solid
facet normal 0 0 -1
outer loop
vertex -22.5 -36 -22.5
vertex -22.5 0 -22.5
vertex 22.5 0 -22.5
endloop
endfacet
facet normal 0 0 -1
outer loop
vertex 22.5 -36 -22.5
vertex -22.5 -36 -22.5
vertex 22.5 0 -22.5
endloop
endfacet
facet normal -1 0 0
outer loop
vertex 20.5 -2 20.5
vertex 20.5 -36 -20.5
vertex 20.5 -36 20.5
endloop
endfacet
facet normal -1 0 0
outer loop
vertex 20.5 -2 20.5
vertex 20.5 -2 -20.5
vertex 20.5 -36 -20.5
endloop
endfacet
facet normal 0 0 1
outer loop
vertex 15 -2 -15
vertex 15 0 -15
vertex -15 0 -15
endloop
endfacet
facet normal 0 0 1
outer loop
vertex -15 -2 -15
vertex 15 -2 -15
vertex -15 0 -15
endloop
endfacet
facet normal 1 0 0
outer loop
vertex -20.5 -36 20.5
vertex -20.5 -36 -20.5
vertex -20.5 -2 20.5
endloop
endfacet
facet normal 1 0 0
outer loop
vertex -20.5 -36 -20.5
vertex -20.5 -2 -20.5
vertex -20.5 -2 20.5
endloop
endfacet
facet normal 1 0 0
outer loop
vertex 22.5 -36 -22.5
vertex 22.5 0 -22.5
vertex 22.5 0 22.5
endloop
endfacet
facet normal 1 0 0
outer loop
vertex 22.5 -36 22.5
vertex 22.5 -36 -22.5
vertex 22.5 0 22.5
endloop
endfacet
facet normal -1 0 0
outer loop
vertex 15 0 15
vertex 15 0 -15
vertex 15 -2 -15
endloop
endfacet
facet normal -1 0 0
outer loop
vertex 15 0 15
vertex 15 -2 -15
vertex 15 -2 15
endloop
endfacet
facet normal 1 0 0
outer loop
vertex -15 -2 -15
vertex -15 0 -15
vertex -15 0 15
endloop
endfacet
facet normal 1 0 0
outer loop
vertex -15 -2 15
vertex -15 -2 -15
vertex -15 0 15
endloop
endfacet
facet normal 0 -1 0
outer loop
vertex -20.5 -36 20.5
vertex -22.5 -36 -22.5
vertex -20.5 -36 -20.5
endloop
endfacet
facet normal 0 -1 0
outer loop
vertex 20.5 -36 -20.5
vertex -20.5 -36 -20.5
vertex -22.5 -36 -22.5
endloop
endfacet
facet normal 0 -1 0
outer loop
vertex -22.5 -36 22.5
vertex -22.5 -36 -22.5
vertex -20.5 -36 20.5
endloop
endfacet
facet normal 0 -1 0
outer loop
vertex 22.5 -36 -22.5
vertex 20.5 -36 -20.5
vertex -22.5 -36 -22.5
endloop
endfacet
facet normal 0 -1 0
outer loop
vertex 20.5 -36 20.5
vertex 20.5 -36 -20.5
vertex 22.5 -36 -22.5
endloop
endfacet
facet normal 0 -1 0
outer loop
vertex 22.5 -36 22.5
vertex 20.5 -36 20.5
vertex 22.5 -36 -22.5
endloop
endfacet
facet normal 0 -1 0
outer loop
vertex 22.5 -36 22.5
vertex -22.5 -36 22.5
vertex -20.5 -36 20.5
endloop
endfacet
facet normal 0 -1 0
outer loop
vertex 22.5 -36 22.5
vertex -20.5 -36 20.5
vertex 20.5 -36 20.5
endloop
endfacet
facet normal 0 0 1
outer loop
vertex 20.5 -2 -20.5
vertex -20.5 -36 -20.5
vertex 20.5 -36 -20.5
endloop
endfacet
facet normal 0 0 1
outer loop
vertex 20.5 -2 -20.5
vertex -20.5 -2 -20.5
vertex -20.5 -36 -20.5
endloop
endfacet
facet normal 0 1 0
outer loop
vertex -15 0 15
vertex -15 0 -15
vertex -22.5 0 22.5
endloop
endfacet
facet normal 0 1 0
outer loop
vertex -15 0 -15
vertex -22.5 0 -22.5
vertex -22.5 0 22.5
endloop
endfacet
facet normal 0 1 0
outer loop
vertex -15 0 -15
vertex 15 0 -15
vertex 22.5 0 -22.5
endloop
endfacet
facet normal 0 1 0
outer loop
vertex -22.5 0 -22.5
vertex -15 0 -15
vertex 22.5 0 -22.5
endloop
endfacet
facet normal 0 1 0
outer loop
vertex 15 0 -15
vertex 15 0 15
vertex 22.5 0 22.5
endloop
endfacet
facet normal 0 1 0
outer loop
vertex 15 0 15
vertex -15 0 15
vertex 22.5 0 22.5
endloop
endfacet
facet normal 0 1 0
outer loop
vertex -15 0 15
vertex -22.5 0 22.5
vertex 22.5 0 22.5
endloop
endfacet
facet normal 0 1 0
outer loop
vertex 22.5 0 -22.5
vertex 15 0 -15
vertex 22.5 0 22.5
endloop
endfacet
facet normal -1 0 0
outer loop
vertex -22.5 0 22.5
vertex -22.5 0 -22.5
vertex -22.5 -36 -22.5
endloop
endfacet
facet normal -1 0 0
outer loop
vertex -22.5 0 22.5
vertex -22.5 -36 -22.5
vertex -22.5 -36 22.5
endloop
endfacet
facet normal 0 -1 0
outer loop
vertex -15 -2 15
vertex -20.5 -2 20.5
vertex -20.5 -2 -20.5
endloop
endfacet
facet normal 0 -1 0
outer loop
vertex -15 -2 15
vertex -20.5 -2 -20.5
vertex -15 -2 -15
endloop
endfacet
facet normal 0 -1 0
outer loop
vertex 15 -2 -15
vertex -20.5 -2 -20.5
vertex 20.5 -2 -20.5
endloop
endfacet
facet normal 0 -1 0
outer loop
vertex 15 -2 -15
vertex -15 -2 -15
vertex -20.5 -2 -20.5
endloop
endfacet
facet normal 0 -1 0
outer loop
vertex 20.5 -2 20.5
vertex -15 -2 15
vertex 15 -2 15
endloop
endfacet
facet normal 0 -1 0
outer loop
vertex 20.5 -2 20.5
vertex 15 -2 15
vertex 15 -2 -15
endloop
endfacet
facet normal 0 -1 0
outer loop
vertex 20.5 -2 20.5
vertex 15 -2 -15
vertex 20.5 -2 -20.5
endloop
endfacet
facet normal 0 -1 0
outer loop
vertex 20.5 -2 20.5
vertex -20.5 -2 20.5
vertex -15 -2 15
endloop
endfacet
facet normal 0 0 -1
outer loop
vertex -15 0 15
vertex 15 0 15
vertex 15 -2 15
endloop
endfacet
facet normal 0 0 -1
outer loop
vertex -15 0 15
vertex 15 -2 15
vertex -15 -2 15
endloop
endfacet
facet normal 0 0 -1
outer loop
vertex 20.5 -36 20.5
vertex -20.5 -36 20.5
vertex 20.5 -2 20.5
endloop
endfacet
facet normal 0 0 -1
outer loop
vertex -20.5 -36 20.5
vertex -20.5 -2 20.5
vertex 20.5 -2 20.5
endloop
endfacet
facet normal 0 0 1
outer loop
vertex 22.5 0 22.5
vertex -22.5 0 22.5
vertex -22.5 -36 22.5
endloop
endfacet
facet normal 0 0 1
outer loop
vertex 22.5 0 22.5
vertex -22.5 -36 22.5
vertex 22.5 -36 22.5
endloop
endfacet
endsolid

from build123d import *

# Parameters (mm, degrees)
F0_W     = 45
F0_H     = 45
F1_DEPTH = 36
F2_T     = -2
F3_W     = 30
F3_H     = 30
F4_DEPTH = 25


with BuildPart() as f1:
    # F0 (on Front) → F1 (new body)
    with BuildSketch(Plane.XZ):
        Rectangle(F0_W, F0_H)
    extrude(amount=F1_DEPTH)

    # F2
    f2_openings = [f1.faces().sort_by_distance(p)[0] for p in [
        (0, -36, 0),
    ]]
    offset(amount=F2_T, openings=f2_openings)

    # F3 (on face) → F4 (cut)
    with BuildSketch(Plane(origin=(0, 0, 0), x_dir=(-1, 0, 0), z_dir=(0, 1, 0))):
        Rectangle(F3_W, F3_H)
    extrude(amount=-F4_DEPTH, mode=Mode.SUBTRACT)


solid = f1.part
